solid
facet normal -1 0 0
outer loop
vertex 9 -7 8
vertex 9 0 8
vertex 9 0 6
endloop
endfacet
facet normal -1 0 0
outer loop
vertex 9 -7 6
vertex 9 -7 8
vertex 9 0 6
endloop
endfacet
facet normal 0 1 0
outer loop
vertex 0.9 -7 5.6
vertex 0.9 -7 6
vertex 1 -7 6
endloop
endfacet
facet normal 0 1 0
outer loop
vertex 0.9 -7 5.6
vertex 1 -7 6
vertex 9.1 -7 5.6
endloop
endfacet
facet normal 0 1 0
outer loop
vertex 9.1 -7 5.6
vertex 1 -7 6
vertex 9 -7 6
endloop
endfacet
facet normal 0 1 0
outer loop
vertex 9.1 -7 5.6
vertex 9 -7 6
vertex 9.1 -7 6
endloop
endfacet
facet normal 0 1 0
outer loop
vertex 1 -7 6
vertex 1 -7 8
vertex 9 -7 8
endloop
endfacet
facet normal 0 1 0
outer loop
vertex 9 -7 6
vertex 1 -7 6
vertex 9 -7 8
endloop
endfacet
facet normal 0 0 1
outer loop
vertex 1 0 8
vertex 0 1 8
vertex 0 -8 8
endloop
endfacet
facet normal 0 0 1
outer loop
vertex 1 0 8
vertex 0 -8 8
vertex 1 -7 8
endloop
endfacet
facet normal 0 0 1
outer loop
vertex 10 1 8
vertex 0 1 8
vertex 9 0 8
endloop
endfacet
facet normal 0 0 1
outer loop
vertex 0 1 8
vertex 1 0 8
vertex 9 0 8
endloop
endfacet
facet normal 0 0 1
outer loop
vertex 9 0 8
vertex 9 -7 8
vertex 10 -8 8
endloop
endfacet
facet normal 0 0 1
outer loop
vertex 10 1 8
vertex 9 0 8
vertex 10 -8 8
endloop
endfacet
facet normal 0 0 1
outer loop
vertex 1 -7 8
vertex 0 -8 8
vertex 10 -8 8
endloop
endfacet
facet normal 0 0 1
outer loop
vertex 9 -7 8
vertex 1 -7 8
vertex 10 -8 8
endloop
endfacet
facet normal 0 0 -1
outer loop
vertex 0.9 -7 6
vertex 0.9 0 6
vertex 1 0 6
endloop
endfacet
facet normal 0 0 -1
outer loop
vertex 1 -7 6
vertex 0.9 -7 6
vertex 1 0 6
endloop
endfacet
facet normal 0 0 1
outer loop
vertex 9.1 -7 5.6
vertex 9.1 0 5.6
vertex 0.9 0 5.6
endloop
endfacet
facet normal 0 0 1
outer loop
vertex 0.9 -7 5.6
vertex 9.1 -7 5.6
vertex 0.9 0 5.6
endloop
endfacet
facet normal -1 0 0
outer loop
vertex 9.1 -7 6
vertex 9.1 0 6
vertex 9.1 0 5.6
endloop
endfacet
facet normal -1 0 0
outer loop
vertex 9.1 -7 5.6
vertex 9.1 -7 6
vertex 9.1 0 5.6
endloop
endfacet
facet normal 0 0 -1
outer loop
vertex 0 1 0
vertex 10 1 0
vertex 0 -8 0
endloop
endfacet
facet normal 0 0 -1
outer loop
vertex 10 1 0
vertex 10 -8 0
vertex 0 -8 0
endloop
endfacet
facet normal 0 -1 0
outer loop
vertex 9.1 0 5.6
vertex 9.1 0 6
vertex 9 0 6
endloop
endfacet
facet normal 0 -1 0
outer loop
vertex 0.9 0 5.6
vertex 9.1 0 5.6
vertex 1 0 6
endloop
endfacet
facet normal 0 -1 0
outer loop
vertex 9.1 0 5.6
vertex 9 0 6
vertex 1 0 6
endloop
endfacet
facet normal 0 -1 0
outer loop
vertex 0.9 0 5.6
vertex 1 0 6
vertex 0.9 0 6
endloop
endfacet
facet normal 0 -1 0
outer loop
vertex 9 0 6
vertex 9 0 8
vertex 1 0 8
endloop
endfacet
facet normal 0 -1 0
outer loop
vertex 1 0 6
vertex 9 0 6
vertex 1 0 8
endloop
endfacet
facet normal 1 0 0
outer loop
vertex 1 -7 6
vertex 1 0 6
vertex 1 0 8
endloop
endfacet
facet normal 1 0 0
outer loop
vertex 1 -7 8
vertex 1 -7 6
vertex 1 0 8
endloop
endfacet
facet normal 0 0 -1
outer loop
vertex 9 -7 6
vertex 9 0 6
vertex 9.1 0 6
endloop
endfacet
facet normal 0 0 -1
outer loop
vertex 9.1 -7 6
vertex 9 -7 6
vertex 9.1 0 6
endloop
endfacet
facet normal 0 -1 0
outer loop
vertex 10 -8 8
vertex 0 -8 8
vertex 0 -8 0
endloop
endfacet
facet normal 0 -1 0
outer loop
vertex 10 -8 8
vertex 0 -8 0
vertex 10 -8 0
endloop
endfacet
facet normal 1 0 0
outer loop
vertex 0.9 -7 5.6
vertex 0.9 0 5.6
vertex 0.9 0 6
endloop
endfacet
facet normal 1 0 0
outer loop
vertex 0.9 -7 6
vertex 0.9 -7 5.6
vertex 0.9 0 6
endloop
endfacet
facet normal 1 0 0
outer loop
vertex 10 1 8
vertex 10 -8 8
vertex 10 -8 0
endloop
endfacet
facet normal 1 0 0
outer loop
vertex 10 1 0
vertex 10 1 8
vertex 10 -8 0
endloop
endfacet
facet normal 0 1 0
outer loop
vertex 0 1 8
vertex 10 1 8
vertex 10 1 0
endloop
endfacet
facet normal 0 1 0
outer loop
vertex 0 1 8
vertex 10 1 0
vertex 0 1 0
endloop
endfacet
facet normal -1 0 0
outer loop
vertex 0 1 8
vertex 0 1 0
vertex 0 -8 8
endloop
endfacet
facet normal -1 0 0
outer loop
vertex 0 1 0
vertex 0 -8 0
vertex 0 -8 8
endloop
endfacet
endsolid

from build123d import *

# Parameters (mm, degrees)
F1_DEPTH = 7
F3_DEPTH = 1
F5_DEPTH = 1


with BuildPart() as f1:
    # F0 (on Front) → F1 (new body)
    with BuildSketch(Plane.XZ):
        Polygon((0, 8), (0, 0), (10, 0), (10, 8), (9, 8), (9, 6), (9.1, 6), (9.1, 5.6), (0.9, 5.6), (0.9, 6), (1, 6), (1, 8), align=None)
    extrude(amount=F1_DEPTH)

    # F2 (on face) → F3 (join)
    with BuildSketch(Plane.XZ.offset(7)):
        Polygon((1, 8), (0, 8), (0, 0), (10, 0), (10, 8), (9, 8), (9, 6), (9.1, 6), (9.1, 5.6), (0.9, 5.6), (0.9, 6), (1, 6), align=None)
        Polygon((9, 8), (1, 8), (1, 6), (0.9, 6), (0.9, 5.6), (9.1, 5.6), (9.1, 6), (9, 6), align=None)
    extrude(amount=F3_DEPTH)

    # F4 (on face) → F5 (join)
    with BuildSketch(Plane(origin=(0, 0, 0), x_dir=(-1, 0, 0), z_dir=(0, 1, 0))):
        Polygon((-9, 8), (-10, 8), (-10, 0), (0, 0), (0, 8), (-1, 8), (-1, 6), (-0.9, 6), (-0.9, 5.6), (-9.1, 5.6), (-9.1, 6), (-9, 6), align=None)
        Polygon((-1, 8), (-9, 8), (-9, 6), (-9.1, 6), (-9.1, 5.6), (-0.9, 5.6), (-0.9, 6), (-1, 6), align=None)
    extrude(amount=F5_DEPTH)


solid = f1.part
